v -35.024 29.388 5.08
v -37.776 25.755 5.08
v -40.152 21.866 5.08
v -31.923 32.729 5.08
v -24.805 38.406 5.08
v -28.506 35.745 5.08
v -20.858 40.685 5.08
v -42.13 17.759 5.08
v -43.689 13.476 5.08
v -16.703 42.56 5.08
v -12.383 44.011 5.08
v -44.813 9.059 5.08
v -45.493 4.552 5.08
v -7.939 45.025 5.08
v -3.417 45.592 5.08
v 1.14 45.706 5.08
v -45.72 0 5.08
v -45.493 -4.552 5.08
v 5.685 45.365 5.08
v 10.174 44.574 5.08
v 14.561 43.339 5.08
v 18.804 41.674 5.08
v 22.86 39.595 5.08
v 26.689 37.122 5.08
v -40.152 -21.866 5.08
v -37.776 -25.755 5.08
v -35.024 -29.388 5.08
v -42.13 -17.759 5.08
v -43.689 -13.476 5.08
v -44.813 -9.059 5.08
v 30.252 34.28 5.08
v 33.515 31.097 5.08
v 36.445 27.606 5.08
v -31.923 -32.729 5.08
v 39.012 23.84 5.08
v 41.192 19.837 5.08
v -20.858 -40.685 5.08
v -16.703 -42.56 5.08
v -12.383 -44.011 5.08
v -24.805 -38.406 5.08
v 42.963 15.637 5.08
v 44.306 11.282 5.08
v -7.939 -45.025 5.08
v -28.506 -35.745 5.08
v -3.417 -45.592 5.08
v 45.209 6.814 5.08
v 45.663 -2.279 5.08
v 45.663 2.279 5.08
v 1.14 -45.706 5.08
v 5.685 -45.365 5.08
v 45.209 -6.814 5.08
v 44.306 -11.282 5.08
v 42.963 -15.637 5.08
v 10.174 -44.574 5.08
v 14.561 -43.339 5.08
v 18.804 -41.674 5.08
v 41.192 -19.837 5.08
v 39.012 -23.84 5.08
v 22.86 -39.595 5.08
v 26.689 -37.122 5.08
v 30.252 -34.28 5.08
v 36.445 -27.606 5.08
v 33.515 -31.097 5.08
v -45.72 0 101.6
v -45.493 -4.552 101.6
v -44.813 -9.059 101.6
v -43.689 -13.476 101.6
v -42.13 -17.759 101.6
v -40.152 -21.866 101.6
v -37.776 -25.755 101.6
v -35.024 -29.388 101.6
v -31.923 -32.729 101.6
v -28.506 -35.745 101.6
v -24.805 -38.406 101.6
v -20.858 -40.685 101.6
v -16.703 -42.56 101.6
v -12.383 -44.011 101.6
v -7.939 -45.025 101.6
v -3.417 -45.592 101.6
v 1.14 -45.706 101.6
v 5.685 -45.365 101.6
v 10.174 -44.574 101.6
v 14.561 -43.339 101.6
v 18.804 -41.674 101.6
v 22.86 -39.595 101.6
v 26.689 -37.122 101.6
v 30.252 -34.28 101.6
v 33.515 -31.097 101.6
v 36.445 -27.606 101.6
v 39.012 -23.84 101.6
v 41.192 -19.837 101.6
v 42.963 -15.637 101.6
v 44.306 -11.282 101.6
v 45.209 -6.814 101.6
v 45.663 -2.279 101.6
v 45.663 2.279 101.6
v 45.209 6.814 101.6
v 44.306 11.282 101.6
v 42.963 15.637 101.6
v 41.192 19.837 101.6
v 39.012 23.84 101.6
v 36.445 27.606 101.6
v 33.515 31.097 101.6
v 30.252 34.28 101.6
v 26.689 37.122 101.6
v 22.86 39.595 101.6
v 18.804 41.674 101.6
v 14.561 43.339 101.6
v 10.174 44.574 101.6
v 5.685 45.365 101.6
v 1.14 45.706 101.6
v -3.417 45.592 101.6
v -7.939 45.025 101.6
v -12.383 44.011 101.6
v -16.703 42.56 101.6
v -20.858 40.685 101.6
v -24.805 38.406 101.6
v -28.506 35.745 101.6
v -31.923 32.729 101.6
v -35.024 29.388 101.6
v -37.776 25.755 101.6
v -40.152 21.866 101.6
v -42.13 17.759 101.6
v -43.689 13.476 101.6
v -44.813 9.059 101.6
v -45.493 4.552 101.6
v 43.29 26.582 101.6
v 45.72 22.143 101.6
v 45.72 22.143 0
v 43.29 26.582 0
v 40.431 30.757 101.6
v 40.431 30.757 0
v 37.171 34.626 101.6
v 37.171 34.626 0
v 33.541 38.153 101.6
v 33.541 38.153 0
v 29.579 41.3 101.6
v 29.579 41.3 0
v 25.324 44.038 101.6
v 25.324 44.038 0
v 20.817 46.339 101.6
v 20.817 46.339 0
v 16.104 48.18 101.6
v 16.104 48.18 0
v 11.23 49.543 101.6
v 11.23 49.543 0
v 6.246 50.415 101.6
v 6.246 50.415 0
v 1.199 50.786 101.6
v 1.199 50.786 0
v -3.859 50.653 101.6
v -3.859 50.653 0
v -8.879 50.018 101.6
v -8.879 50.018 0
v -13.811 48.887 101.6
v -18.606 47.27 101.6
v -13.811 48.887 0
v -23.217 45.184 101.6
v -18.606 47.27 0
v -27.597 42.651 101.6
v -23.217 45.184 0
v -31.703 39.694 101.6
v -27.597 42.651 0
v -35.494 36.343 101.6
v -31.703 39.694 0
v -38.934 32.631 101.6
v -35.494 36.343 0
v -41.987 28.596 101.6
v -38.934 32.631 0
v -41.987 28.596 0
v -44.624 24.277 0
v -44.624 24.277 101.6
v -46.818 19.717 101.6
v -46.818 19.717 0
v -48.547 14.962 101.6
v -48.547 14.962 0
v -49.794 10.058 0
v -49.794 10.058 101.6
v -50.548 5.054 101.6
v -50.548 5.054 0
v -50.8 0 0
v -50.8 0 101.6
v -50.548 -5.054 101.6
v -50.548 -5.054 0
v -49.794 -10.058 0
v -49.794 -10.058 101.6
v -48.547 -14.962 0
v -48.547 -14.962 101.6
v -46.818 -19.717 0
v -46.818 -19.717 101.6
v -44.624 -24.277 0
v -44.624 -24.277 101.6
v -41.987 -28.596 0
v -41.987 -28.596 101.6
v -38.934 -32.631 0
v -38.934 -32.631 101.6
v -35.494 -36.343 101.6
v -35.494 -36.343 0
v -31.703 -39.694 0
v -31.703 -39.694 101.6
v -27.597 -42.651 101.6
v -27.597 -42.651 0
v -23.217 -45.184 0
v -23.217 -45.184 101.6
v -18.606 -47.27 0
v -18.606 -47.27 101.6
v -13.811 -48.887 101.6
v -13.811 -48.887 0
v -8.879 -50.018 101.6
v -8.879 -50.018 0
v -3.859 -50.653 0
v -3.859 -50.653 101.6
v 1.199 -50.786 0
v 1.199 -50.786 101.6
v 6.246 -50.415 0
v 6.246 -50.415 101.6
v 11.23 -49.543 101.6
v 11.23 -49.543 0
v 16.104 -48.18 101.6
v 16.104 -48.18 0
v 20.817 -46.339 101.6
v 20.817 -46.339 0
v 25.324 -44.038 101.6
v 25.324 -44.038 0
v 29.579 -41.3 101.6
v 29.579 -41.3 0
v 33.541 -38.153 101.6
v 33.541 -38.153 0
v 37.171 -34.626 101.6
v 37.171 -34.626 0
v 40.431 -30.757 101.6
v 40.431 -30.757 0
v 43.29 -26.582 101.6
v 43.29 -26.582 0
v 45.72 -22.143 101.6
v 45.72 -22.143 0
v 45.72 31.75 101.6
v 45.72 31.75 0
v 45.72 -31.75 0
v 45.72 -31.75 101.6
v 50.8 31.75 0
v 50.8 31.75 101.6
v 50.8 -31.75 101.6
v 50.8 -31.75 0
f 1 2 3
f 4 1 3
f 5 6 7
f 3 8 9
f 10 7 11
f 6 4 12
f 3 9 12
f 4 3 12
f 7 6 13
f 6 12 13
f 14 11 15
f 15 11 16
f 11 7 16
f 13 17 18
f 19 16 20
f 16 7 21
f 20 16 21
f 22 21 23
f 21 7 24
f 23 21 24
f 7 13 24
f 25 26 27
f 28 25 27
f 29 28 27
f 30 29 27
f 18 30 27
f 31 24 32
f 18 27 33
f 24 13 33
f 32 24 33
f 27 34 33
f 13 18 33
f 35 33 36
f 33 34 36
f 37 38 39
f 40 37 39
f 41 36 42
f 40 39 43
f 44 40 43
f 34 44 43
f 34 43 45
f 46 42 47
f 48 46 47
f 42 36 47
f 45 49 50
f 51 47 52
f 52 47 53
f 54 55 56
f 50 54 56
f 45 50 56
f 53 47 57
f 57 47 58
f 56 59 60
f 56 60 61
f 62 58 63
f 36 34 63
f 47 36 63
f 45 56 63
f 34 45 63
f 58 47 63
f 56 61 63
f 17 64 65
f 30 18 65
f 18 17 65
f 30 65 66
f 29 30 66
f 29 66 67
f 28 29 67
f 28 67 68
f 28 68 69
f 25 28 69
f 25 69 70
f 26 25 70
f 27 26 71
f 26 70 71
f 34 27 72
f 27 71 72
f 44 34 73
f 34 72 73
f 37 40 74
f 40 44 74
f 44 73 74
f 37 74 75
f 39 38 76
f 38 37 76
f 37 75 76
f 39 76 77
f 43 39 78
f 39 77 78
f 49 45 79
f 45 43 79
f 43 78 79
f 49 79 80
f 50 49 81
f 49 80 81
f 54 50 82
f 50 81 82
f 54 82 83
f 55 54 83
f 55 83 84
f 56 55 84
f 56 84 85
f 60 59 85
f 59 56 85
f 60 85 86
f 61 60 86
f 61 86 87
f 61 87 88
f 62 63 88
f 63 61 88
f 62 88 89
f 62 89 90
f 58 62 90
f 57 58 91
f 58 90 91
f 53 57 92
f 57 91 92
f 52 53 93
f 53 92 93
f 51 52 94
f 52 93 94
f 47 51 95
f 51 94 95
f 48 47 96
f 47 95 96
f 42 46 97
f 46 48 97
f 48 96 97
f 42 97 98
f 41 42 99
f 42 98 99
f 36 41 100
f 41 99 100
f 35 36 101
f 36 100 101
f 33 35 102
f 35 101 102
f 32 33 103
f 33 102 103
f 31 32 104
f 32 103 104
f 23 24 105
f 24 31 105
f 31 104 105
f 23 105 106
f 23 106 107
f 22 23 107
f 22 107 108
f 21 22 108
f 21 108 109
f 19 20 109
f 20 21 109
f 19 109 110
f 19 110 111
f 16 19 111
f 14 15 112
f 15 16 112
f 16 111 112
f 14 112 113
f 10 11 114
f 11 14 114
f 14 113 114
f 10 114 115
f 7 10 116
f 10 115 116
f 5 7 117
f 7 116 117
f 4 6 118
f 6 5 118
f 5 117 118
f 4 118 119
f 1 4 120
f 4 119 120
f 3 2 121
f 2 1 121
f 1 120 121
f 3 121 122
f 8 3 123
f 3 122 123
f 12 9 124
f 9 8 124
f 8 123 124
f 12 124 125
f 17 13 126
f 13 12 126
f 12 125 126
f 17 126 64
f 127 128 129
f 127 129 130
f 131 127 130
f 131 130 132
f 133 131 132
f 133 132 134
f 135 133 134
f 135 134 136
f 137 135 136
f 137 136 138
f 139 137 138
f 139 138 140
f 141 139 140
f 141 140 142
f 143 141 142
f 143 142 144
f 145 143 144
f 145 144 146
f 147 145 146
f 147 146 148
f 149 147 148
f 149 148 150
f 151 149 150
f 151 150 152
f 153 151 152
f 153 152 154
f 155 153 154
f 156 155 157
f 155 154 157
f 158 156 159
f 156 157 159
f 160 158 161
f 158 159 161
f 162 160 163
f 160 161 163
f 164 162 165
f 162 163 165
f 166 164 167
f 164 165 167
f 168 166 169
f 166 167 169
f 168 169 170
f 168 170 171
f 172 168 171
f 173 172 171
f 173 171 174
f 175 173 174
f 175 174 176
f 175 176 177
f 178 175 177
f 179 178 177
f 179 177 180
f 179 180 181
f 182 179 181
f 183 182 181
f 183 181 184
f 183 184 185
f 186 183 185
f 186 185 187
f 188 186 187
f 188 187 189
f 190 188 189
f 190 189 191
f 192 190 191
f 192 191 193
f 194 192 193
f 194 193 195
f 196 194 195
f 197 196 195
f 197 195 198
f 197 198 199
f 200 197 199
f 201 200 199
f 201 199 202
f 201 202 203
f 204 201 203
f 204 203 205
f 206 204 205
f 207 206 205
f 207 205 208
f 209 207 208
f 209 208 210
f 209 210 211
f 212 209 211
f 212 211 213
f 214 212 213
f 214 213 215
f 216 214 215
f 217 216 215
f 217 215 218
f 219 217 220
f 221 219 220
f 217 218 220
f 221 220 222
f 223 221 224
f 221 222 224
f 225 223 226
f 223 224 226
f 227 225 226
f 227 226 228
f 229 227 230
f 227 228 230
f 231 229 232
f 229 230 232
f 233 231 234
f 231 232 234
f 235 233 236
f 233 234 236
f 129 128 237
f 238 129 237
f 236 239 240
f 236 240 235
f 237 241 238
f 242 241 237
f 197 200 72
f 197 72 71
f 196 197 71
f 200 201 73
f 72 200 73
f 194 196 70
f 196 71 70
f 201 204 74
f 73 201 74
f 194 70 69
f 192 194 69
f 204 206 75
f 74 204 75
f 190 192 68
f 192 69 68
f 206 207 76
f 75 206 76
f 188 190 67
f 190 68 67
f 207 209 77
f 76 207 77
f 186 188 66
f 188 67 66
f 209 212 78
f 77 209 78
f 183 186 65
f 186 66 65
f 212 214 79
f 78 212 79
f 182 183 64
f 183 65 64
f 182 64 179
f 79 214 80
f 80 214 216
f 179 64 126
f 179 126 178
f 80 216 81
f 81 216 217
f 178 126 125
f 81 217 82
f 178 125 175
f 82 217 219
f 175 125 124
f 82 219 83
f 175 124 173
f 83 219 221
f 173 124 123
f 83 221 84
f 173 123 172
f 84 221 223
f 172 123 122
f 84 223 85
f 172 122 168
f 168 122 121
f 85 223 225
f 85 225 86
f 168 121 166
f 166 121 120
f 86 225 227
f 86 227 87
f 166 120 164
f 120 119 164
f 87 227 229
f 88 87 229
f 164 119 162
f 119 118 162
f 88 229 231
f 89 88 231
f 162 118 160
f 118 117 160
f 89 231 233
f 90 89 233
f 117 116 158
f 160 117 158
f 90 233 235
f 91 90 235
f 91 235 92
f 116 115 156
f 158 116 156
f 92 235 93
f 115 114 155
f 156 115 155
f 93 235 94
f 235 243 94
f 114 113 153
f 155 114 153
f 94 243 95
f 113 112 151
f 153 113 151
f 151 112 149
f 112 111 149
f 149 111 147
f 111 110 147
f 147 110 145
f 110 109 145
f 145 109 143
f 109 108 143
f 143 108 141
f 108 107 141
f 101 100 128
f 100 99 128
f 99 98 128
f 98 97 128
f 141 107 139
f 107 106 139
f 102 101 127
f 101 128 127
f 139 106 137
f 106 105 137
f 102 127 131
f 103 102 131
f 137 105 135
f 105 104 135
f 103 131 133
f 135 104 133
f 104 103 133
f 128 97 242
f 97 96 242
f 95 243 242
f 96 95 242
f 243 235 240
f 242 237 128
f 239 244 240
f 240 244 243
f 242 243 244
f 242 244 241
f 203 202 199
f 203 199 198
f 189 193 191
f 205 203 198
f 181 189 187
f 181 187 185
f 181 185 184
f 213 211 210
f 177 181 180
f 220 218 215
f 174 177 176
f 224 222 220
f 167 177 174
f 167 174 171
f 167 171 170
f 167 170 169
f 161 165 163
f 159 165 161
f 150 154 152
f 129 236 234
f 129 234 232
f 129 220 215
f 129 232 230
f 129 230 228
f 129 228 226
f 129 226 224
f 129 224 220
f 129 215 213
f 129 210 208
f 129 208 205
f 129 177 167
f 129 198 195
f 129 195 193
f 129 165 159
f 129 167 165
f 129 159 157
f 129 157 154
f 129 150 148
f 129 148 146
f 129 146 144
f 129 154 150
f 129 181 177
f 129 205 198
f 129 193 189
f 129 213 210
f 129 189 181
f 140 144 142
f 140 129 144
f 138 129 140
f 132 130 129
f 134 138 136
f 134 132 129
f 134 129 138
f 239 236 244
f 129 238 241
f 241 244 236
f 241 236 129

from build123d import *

# Parameters (mm, degrees)
F4_W     = 63.5
F4_H     = 101.6
F5_DEPTH = 5.08


with BuildPart() as f2:
    # F0 (on Front) → F2 (revolve)
    with BuildSketch(Plane.XZ):
        Polygon((-45.72, 101.6), (-50.8, 101.6), (-50.8, 0), (-45.72, 0), (0, 0), (0, 5.08), (-45.72, 5.08), align=None)
    revolve(axis=Axis((0, 0, 36.652558), (0, 0, 1)))

    # F4 (on offset) → F5 (join)
    with BuildSketch(Plane.YZ.offset(50.8)):
        with Locations((0, 50.8)):
            Rectangle(F4_W, F4_H)
    extrude(amount=-F5_DEPTH)


solid = f2.part
